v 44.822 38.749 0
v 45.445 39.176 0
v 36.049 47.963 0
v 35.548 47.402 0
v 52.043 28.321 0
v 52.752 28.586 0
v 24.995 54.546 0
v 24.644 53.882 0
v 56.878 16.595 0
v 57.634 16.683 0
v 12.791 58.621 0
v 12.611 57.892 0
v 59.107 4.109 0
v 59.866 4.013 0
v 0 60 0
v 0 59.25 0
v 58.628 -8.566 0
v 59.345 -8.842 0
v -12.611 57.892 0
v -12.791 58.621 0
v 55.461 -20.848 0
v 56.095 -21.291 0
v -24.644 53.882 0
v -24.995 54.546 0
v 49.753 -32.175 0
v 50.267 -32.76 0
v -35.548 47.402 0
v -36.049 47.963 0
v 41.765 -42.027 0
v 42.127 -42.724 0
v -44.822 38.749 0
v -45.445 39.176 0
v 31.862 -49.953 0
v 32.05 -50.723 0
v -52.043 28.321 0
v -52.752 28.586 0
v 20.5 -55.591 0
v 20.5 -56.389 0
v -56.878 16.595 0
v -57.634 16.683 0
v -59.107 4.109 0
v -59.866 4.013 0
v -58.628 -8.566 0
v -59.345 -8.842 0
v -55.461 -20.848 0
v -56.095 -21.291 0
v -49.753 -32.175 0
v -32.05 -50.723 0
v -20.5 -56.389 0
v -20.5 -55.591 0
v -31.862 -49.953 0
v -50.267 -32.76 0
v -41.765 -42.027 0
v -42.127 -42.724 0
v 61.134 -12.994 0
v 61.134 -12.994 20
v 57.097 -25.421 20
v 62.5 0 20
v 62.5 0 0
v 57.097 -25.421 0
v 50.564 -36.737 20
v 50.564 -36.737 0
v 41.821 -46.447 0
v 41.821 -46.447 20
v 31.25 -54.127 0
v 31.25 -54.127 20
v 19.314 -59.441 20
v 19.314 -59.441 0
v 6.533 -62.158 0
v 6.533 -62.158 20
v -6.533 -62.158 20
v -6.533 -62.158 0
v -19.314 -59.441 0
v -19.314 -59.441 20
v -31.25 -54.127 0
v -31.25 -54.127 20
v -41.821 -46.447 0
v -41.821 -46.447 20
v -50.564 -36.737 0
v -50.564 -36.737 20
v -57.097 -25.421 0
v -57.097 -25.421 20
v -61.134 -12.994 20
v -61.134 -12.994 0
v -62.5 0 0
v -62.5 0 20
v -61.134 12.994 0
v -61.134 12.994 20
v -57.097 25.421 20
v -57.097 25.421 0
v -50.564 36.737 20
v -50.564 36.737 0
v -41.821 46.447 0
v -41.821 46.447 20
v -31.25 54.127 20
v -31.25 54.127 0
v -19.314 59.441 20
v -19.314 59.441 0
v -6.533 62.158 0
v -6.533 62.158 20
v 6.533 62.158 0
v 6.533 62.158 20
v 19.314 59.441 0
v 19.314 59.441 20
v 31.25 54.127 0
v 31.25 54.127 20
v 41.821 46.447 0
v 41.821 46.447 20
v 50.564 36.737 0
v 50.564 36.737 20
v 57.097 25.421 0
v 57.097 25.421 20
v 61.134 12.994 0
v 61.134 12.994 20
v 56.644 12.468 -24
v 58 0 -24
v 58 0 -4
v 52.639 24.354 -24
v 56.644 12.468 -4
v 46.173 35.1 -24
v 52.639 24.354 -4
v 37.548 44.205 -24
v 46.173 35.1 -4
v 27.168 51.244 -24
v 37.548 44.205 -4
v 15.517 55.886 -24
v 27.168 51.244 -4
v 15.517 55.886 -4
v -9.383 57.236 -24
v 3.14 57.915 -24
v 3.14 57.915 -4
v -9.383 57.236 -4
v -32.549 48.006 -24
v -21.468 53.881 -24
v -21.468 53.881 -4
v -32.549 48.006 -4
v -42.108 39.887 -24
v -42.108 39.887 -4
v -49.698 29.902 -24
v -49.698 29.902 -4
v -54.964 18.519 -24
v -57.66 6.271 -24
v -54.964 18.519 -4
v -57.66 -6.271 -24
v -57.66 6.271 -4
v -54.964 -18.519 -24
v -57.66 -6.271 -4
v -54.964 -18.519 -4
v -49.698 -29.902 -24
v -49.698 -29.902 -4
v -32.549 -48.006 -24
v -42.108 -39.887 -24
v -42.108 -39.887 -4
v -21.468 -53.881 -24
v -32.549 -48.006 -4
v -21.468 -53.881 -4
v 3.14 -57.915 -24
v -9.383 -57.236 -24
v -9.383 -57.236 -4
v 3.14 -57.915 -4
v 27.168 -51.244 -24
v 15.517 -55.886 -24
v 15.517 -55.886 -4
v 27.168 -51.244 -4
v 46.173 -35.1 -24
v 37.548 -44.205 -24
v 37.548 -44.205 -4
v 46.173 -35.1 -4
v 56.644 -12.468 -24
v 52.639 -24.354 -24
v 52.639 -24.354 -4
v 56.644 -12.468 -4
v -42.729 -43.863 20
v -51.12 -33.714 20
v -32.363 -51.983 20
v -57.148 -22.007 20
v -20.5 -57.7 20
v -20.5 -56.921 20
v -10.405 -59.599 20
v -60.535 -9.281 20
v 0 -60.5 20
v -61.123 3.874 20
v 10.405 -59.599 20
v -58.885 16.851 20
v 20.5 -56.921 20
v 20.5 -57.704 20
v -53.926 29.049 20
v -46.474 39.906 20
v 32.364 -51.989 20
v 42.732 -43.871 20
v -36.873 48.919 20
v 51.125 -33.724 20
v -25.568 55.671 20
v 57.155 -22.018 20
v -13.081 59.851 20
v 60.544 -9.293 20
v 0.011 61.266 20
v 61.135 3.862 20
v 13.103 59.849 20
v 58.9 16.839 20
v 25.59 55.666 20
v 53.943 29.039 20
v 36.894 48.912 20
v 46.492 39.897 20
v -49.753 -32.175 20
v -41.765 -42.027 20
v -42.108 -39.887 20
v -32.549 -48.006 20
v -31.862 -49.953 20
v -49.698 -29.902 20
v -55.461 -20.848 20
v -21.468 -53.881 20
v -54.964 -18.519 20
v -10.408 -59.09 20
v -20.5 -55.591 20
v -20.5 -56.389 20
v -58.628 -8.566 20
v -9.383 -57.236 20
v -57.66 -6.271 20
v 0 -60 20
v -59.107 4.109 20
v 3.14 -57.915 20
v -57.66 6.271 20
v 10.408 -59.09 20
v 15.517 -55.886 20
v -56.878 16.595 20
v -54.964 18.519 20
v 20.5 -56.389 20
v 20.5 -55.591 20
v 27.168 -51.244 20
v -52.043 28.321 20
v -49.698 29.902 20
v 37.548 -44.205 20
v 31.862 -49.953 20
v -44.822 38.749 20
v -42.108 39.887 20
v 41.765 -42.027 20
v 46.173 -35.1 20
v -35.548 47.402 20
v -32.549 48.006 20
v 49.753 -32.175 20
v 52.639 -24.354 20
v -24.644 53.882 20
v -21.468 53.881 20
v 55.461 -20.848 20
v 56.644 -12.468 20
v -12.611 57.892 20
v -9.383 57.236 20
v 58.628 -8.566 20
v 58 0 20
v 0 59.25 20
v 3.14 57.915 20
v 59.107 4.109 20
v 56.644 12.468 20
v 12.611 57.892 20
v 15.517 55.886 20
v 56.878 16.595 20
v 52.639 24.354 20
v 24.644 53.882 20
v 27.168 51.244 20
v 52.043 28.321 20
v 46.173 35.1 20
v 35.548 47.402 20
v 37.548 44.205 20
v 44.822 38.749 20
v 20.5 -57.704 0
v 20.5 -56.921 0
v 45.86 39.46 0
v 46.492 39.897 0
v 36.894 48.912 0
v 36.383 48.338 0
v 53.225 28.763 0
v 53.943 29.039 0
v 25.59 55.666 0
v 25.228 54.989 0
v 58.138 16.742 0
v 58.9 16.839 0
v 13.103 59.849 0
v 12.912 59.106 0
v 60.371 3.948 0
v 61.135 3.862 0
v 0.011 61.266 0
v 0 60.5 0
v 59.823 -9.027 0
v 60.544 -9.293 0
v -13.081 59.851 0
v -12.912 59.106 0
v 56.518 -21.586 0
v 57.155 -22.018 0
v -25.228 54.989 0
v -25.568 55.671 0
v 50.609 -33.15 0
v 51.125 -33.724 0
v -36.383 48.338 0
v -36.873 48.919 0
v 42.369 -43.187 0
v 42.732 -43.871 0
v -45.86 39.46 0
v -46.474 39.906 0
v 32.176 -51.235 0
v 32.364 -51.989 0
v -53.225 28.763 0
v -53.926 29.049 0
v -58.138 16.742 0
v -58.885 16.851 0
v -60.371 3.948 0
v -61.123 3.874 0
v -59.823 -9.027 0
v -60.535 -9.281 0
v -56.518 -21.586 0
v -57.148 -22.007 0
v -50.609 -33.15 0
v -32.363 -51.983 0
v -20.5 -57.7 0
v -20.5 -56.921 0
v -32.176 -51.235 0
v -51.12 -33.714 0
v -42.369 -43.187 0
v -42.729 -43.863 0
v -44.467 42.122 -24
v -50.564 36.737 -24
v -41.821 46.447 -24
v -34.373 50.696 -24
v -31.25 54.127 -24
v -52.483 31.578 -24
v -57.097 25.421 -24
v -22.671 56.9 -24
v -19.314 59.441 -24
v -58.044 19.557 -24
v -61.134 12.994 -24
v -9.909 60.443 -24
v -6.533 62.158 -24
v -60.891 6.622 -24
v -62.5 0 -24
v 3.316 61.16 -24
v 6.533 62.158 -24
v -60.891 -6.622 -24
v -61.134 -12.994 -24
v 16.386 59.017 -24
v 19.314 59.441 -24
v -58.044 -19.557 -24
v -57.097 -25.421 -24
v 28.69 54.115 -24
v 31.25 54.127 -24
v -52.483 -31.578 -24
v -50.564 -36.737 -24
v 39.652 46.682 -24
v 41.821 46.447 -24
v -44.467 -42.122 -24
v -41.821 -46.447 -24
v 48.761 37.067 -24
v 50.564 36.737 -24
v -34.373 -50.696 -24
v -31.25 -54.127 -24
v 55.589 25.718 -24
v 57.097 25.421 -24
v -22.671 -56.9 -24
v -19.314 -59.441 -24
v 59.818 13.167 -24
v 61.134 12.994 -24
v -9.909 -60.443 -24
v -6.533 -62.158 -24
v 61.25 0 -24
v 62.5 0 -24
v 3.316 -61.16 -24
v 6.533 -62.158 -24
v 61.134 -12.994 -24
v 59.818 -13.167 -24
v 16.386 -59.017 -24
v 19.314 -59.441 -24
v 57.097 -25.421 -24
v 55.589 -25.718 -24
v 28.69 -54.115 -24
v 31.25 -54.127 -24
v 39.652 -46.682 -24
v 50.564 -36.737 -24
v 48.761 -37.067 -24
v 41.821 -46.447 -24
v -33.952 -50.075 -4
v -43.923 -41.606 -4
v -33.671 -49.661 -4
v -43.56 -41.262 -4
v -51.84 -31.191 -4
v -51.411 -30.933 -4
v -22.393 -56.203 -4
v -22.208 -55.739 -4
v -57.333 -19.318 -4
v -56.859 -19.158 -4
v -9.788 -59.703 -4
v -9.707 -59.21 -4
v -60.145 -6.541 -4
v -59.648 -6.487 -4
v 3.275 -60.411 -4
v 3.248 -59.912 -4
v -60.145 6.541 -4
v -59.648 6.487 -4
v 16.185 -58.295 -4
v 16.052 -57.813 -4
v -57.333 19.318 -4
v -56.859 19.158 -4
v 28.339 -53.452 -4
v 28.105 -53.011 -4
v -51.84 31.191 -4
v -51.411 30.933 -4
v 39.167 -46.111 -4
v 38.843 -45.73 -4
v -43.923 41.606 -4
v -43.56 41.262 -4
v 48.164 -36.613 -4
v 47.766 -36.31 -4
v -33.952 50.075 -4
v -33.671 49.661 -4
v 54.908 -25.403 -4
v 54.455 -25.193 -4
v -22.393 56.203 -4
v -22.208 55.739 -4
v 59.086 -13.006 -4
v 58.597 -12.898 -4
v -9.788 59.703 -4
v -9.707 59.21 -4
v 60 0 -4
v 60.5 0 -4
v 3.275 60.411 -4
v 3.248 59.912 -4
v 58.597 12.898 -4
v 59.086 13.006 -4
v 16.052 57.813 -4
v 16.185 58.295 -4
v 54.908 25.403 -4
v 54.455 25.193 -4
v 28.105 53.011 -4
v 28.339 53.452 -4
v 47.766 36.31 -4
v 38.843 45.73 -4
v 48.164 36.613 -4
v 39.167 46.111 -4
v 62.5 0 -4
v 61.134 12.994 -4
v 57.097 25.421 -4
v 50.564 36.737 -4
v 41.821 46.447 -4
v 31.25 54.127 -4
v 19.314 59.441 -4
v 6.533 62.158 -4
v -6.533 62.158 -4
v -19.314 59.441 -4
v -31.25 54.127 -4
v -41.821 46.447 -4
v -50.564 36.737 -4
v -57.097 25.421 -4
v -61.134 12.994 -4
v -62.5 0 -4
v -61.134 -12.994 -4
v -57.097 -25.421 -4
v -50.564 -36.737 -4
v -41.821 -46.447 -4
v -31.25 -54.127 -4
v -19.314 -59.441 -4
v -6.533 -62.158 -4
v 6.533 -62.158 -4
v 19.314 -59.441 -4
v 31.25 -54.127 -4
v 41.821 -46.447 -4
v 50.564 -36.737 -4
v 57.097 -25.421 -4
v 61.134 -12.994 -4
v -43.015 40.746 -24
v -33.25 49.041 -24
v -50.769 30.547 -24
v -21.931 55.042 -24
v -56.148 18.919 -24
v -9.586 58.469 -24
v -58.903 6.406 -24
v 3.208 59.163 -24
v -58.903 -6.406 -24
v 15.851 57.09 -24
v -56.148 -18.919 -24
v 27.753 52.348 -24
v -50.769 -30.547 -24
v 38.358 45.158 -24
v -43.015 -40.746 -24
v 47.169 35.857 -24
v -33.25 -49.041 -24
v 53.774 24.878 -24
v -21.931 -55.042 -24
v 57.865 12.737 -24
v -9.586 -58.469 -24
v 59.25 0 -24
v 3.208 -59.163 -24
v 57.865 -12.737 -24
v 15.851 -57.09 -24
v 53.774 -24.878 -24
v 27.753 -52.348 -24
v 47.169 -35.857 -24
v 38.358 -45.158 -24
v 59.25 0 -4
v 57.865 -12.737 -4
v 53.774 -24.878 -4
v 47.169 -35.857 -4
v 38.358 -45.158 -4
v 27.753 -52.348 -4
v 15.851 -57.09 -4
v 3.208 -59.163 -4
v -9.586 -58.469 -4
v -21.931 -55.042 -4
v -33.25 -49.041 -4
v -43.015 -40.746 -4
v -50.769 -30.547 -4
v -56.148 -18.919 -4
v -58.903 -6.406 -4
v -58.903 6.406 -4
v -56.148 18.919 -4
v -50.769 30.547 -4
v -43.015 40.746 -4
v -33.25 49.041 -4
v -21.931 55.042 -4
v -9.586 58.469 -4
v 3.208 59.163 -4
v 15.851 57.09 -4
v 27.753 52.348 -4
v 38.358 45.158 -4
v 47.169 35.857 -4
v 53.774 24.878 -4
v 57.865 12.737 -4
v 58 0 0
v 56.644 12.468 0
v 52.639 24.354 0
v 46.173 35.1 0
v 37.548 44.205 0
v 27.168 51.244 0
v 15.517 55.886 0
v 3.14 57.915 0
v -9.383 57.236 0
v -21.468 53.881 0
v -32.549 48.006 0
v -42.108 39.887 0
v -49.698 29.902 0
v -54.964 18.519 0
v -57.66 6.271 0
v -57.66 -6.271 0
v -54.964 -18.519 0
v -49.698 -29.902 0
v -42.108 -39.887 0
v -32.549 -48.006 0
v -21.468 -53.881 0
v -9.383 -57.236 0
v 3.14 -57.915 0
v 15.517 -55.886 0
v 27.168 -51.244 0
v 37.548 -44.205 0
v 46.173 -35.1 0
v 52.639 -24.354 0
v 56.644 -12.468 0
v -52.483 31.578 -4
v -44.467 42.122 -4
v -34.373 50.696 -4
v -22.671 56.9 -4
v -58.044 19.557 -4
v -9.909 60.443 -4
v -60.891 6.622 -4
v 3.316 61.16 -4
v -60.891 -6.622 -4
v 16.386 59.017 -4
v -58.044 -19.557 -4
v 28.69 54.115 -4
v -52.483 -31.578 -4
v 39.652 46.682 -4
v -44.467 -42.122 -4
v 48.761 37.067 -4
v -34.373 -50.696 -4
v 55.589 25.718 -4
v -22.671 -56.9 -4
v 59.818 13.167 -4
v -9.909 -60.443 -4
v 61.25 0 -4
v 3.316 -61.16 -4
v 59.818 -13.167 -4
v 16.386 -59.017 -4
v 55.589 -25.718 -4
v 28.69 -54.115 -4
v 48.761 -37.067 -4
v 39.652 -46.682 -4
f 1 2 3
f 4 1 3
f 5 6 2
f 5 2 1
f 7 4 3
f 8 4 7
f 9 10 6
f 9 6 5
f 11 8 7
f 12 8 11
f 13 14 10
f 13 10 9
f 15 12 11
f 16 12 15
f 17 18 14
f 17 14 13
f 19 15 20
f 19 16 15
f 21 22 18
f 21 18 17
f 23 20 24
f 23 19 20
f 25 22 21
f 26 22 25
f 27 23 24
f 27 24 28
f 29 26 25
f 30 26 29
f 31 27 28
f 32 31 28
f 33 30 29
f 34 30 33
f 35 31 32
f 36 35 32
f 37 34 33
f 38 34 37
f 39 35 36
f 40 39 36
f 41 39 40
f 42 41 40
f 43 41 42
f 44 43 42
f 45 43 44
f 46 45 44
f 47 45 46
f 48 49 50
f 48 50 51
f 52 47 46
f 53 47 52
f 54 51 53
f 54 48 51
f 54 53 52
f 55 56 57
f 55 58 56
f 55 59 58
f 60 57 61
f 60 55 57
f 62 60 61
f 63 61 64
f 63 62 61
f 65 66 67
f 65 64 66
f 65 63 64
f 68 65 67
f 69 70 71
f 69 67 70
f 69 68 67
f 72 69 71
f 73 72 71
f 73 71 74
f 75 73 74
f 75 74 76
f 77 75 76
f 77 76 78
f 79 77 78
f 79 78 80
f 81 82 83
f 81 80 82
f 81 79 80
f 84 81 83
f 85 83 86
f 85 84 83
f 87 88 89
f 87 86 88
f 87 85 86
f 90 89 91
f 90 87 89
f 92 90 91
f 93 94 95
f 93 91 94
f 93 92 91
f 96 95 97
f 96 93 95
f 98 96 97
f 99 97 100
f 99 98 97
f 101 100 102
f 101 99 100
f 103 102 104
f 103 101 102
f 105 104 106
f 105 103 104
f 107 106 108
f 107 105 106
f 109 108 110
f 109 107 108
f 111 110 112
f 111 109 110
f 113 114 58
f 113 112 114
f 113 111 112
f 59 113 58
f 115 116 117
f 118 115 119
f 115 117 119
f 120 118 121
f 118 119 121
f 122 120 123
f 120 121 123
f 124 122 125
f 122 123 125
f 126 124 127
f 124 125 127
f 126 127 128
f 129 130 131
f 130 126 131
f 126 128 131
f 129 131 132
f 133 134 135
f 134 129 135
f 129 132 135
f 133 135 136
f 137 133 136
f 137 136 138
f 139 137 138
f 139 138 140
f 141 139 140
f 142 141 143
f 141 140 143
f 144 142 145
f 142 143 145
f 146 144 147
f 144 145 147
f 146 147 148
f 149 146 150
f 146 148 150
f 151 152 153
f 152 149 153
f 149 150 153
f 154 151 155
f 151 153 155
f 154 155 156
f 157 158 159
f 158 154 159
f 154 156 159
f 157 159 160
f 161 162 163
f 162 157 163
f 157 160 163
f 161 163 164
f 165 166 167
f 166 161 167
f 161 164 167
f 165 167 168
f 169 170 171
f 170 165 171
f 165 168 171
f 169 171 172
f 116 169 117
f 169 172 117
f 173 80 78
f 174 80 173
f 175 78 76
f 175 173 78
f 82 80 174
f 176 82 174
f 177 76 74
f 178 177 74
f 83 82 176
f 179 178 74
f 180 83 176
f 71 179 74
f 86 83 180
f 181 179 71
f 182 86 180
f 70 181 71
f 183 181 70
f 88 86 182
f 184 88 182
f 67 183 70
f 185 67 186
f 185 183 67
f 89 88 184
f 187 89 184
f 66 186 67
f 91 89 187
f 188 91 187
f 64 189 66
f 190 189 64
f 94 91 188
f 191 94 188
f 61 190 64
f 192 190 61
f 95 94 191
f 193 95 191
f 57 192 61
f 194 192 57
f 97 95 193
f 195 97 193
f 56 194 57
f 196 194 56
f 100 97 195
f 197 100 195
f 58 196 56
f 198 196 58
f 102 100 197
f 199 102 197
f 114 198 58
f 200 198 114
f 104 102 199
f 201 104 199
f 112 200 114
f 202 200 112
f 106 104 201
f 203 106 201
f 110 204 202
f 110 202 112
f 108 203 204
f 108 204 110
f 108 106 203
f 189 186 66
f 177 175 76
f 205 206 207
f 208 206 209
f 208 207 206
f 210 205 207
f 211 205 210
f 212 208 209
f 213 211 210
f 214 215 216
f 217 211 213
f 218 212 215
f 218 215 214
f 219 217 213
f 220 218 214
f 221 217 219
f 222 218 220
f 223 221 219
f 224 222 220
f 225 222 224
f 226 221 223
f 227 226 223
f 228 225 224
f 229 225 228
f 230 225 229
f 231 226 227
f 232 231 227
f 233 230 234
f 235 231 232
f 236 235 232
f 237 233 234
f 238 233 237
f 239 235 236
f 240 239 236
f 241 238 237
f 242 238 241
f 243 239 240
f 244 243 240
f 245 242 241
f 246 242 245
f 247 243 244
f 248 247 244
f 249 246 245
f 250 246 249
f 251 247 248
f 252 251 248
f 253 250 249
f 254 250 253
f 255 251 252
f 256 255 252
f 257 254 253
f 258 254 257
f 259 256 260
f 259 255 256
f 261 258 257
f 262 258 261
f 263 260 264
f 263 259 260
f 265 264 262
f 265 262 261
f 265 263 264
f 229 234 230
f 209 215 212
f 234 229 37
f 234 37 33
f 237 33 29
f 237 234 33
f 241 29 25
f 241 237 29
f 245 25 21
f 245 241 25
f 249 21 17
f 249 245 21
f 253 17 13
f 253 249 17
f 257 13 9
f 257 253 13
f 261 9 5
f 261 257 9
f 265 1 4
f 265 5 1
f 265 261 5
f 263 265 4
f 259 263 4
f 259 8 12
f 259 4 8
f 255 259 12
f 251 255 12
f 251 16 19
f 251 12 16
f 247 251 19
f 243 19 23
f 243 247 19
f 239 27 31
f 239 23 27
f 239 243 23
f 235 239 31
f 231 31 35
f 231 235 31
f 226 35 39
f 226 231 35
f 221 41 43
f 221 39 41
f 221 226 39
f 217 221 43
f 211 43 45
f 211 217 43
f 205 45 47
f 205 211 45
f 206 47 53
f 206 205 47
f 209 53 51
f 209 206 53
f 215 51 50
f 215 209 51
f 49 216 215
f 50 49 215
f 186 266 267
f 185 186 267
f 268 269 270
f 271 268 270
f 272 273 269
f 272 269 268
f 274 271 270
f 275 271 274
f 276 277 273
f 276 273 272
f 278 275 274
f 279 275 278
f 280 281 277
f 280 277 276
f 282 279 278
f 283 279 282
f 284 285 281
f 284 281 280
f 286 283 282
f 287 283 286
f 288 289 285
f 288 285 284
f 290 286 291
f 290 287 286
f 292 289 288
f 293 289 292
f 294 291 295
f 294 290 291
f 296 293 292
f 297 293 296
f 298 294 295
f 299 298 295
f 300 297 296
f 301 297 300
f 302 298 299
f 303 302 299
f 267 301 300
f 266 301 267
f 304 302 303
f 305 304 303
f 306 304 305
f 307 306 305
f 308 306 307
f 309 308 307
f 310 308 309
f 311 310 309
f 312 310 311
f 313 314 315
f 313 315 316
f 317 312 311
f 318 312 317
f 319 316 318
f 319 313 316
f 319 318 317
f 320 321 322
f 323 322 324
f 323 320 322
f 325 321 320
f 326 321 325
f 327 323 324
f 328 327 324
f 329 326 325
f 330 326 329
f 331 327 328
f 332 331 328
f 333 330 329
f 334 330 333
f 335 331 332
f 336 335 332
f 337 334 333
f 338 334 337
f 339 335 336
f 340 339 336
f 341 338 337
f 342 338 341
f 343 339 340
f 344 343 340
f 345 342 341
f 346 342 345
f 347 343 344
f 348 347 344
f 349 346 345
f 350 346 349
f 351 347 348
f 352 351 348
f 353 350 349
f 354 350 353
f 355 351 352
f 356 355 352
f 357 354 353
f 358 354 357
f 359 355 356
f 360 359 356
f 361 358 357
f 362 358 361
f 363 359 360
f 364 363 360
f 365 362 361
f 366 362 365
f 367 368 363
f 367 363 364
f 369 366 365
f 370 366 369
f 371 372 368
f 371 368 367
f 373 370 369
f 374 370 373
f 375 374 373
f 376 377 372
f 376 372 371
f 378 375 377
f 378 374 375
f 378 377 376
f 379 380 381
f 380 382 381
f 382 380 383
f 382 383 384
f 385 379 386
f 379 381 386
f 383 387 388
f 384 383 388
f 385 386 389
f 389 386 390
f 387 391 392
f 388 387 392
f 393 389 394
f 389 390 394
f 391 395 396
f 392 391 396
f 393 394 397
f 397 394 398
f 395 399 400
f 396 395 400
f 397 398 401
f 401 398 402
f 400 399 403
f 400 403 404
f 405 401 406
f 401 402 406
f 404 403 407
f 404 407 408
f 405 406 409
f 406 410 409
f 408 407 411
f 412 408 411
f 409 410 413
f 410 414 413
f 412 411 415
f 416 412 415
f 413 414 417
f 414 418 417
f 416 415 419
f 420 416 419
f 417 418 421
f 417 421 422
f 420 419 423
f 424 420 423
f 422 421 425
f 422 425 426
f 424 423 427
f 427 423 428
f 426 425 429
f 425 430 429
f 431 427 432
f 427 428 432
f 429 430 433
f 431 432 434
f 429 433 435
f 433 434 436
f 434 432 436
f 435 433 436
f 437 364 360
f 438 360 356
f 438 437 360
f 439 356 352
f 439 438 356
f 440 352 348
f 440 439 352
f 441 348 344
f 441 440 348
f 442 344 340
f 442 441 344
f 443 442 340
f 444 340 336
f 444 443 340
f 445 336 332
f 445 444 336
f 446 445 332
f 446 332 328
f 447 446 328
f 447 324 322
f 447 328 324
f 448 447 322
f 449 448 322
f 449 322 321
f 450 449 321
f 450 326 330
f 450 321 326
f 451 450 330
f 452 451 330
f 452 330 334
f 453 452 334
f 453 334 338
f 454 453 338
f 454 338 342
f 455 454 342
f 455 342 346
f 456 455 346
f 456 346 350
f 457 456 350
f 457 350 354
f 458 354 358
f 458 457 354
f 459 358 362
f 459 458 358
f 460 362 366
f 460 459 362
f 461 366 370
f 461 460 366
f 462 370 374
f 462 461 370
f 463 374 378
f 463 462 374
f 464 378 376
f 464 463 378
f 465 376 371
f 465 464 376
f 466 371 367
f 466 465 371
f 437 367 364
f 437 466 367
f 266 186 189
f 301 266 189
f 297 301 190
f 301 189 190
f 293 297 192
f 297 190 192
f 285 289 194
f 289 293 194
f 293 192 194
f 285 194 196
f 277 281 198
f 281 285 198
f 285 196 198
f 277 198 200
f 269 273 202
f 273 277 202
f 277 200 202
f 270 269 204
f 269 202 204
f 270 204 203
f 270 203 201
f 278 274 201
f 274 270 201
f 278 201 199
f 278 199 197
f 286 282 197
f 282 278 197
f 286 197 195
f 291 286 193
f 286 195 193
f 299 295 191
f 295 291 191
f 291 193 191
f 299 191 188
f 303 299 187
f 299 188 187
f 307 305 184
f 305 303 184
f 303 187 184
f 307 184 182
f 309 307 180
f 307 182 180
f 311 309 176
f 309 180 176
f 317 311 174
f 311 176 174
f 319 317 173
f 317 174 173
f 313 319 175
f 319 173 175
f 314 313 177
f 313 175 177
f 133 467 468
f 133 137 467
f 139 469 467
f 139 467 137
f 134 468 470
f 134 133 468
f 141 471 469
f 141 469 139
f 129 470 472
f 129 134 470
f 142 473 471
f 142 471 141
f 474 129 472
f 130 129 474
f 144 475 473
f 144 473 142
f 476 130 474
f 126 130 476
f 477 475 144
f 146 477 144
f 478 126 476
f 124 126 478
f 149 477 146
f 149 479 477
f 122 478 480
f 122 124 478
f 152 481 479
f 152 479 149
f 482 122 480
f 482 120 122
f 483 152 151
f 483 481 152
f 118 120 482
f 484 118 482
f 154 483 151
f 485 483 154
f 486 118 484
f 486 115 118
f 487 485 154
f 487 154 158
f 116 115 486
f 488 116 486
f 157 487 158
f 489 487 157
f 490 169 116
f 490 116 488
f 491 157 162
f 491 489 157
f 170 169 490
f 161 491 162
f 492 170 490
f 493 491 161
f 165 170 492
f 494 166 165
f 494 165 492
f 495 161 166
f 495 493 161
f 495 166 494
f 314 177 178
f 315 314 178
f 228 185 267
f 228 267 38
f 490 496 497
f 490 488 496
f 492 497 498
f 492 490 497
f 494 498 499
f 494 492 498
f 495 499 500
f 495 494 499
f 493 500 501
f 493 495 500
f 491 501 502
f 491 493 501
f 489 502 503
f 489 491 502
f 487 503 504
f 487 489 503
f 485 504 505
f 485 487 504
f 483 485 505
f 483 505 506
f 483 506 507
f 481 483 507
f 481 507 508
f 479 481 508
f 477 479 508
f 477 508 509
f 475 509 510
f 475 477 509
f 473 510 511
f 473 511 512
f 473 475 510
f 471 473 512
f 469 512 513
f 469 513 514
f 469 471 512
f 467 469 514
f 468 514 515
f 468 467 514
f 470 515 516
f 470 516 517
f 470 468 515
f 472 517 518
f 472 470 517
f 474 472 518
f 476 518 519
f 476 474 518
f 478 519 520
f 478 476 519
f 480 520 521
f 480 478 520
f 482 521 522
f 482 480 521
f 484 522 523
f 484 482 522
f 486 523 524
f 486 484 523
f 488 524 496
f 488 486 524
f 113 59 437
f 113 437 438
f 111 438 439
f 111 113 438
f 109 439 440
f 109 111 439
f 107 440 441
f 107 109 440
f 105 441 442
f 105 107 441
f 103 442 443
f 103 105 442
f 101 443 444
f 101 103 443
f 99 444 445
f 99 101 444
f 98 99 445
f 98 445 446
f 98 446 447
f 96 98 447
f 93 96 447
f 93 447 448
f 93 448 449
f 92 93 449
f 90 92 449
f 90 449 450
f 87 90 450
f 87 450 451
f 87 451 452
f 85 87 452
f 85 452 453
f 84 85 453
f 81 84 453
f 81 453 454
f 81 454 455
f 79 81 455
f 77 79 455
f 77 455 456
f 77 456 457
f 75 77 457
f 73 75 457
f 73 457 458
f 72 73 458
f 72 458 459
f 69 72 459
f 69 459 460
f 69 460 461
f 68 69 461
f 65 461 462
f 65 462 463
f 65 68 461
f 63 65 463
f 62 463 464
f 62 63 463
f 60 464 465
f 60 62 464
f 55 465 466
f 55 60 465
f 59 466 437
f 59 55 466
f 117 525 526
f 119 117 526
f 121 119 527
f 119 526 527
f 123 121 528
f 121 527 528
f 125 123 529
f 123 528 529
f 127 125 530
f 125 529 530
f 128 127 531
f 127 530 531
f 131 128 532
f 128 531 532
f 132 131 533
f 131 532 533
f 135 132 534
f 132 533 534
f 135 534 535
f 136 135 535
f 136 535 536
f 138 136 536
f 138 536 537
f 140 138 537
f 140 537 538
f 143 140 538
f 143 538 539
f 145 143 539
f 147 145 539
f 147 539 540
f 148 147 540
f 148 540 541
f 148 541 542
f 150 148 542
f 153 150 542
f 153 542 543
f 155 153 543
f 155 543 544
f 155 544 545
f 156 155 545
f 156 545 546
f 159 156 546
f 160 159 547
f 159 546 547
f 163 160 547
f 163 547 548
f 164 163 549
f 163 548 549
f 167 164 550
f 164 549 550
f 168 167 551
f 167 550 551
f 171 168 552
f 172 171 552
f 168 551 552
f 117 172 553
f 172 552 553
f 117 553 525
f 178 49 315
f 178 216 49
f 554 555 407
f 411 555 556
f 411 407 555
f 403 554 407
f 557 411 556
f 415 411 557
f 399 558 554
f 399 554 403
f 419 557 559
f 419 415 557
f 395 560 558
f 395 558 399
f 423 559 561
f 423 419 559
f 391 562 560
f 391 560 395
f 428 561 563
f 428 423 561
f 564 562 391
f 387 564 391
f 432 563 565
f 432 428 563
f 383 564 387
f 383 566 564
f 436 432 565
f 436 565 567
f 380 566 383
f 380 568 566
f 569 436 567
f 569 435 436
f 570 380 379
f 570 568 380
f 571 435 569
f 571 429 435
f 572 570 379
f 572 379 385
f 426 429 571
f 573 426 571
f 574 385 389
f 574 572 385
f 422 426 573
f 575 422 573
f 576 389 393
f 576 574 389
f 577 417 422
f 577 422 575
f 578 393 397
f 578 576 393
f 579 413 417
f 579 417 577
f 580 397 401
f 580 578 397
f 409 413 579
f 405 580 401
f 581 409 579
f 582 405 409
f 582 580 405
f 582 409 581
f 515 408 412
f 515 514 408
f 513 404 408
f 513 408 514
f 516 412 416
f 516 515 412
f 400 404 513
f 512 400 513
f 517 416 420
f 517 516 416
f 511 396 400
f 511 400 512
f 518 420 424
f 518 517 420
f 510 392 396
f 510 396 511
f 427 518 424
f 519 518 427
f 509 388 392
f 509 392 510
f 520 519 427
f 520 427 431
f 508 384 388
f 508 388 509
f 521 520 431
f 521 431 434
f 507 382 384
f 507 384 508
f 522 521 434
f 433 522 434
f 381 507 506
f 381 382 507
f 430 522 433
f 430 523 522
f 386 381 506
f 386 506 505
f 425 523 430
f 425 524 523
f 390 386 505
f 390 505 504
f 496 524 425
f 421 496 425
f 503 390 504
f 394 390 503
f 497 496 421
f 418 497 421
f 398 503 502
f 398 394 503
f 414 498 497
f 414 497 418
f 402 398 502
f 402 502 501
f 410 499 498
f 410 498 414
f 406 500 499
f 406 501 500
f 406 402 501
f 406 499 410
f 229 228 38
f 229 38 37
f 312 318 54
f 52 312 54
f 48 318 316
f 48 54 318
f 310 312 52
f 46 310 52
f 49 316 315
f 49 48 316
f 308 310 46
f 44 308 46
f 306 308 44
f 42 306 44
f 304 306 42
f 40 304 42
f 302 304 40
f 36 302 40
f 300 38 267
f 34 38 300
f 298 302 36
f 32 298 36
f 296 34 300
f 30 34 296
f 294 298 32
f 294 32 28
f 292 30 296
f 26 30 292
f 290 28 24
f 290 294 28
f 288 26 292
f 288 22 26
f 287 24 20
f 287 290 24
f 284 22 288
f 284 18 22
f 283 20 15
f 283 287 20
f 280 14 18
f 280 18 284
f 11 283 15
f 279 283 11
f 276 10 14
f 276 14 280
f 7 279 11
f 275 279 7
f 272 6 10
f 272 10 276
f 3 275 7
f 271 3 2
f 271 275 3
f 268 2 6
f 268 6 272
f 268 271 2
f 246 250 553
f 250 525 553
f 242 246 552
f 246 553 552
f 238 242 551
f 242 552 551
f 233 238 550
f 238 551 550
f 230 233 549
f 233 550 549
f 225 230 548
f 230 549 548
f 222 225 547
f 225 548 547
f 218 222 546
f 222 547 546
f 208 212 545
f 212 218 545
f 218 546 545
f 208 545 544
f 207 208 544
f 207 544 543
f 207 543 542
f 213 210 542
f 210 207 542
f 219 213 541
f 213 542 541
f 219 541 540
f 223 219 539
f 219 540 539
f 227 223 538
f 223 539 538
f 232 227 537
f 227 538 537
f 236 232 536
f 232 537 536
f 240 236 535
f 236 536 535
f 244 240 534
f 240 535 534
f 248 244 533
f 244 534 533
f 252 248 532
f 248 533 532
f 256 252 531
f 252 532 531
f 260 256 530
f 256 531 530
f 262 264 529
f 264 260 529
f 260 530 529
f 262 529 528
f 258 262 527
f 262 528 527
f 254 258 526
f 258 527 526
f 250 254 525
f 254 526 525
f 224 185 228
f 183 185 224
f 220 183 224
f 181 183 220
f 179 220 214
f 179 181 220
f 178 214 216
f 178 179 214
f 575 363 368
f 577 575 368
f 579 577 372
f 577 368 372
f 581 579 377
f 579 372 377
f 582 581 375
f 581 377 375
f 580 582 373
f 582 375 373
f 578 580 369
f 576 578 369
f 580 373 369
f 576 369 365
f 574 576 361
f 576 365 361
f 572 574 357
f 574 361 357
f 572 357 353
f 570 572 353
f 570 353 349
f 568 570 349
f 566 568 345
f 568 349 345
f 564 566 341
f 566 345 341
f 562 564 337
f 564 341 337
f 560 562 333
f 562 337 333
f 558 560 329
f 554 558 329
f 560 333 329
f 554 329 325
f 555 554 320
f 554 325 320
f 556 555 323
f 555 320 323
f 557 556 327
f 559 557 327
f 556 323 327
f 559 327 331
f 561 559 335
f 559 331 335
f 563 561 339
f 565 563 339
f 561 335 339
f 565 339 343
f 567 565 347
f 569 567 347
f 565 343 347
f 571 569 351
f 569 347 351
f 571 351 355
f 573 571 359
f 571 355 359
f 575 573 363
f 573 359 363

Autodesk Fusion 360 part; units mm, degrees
sketch "Sketch1" plane through (0, 0, 0) normal (0, 0, 1) x (1, 0, 0)
  circle A0 centre (0, 0) radius 60
  circle A1 centre (0, 0) radius 58
  circle A2 centre (0, 0) radius 60.5
  circle A3 centre (0, 0) radius 62.5
  dimension "d1" = 120
  dimension "d2" = 116
  dimension "d3" = 121
  dimension "d4" = 125
extrude "Extrude1" add sketch "Sketch1" along normal blind 20 makes body 1 at (59.9254, -2.9908, 13.3333) makes body 2 at (62.4223, -3.1154, 13.3333)
sketch "Sketch2" plane through (0, 0, 0) normal (0, 0, -1) x (1, 0, 0)
  circle A0 centre (0, 0) radius 58
  circle A1 centre (0, 0) radius 60
  circle A2 centre (0, 0) radius 60
  circle A3 centre (0, 0) radius 60.5
  dimension "d11" = 120
  dimension "d12" = 121
extrude "Extrude2" add sketch "Sketch1" against normal blind 4 contours A0 | A2 | A3 bodies 2 1
sketch "Sketch3" plane through (0, 0, -4) normal (0, 0, -1) x (1, 0, 0)
  circle A0 centre (0, 0) radius 58
  circle A1 centre (0, 0) radius 62.5
  circle A2 centre (0, 0) radius 58
  circle A3 centre (0, 0) radius 60
  circle A4 centre (0, 0) radius 60.5
  circle A5 centre (0, 0) radius 62.5
  dimension "d13" = 116
  dimension "d14" = 120
  dimension "d15" = 121
  dimension "d16" = 125
extrude "Extrude4" add sketch "Sketch3" along normal blind 20 bodies 2
sketch "Sketch4" plane through (0, 0, 20) normal (0, 0, 1) x (-1, 0, 0)
  circle A0 centre (0, 0) radius 60.5
  circle A1 centre (0, 0) radius 62.5
  line L0 (0, 0) -> (0, 62.5)
  line L1 (0, 0) -> (-20.5, 0)
  line L2 (0, 62.5) -> (20.5, 62.5)
  line L3 (-20.5, 0) -> (20.5, 0)
  line L4 (20.5, 0) -> (20.5, 62.5)
  line L5 (20.5, 62.5) -> (-20.5, 62.5)
  line L6 (-20.5, 62.5) -> (-20.5, 0)
  circle A2 centre (0, 0) radius 60
  dimension "d19" = 20.5
  dimension "d21" = 20.5
  dimension "d22" = 120
extrude "Extrude5" add sketch "Sketch4" against normal blind 20 contours A0 L0 L4 A2 | A0 L0 L6 A2 bodies 2
copy_body "Body->Comp1" bodies 2 removing the originals makes body 3 in component "midjoint"
sketch "Sketch5" plane through (0, 0, -24) normal (0, 0, -1) x (1, 0, 0)
  circle A0 centre (0, 0) radius 58
  circle A1 centre (0, 0) radius 60
  circle A2 centre (0, 0) radius 59.25
  circle A3 centre (0, 0) radius 61.25
  dimension "d35" = 118.5
  dimension "d36" = 122.5
extrude "Extrude1'" cut sketch "Sketch5" against normal blind 20 contours A1 | A3 bodies 3 in component "midjoint"
sketch "Sketch6" plane through (0, 0, 20) normal (0, 0, 1) x (-1, 0, 0)
  circle A0 centre (0, 0) radius 62.5
  circle A1 centre (0, 0) radius 58
  arc A2 (-20.5, 56.3893) -> (20.5, 56.3893) centre (0, 0) ccw
  line L0 (20.5, 56.3893) -> (20.5, 56.921)
  arc A3 (-20.5, 56.921) -> (20.5, 56.921) centre (0, 0) ccw
  line L1 (-20.5, 56.921) -> (-20.5, 56.3893)
  circle A4 centre (0, 0) radius 59.25
  circle A5 centre (-0.0055, -0.0156) radius 61.25
  line L2 (20.5, 56.921) -> (20.5, 57.7)
  line L3 (20.5, 56.3893) -> (20.5, 55.5906)
  line L4 (-20.5, 56.921) -> (-20.5, 57.7039)
  line L5 (-20.5, 56.3893) -> (-20.5, 55.5906)
  dimension "d33" = 118.5
  dimension "d34" = 122.5
extrude "Extrude2'" cut sketch "Sketch6" against normal blind 20 contours A2 A4 L3 L5 | A2 L0 A3 L1 | A3 A5 L2 L4 bodies 3 in component "midjoint"
component "midjoint" placed x (1, 0, 0) y (0, 1, 0) z (0, 0, 1) at (0, 0, 0)
